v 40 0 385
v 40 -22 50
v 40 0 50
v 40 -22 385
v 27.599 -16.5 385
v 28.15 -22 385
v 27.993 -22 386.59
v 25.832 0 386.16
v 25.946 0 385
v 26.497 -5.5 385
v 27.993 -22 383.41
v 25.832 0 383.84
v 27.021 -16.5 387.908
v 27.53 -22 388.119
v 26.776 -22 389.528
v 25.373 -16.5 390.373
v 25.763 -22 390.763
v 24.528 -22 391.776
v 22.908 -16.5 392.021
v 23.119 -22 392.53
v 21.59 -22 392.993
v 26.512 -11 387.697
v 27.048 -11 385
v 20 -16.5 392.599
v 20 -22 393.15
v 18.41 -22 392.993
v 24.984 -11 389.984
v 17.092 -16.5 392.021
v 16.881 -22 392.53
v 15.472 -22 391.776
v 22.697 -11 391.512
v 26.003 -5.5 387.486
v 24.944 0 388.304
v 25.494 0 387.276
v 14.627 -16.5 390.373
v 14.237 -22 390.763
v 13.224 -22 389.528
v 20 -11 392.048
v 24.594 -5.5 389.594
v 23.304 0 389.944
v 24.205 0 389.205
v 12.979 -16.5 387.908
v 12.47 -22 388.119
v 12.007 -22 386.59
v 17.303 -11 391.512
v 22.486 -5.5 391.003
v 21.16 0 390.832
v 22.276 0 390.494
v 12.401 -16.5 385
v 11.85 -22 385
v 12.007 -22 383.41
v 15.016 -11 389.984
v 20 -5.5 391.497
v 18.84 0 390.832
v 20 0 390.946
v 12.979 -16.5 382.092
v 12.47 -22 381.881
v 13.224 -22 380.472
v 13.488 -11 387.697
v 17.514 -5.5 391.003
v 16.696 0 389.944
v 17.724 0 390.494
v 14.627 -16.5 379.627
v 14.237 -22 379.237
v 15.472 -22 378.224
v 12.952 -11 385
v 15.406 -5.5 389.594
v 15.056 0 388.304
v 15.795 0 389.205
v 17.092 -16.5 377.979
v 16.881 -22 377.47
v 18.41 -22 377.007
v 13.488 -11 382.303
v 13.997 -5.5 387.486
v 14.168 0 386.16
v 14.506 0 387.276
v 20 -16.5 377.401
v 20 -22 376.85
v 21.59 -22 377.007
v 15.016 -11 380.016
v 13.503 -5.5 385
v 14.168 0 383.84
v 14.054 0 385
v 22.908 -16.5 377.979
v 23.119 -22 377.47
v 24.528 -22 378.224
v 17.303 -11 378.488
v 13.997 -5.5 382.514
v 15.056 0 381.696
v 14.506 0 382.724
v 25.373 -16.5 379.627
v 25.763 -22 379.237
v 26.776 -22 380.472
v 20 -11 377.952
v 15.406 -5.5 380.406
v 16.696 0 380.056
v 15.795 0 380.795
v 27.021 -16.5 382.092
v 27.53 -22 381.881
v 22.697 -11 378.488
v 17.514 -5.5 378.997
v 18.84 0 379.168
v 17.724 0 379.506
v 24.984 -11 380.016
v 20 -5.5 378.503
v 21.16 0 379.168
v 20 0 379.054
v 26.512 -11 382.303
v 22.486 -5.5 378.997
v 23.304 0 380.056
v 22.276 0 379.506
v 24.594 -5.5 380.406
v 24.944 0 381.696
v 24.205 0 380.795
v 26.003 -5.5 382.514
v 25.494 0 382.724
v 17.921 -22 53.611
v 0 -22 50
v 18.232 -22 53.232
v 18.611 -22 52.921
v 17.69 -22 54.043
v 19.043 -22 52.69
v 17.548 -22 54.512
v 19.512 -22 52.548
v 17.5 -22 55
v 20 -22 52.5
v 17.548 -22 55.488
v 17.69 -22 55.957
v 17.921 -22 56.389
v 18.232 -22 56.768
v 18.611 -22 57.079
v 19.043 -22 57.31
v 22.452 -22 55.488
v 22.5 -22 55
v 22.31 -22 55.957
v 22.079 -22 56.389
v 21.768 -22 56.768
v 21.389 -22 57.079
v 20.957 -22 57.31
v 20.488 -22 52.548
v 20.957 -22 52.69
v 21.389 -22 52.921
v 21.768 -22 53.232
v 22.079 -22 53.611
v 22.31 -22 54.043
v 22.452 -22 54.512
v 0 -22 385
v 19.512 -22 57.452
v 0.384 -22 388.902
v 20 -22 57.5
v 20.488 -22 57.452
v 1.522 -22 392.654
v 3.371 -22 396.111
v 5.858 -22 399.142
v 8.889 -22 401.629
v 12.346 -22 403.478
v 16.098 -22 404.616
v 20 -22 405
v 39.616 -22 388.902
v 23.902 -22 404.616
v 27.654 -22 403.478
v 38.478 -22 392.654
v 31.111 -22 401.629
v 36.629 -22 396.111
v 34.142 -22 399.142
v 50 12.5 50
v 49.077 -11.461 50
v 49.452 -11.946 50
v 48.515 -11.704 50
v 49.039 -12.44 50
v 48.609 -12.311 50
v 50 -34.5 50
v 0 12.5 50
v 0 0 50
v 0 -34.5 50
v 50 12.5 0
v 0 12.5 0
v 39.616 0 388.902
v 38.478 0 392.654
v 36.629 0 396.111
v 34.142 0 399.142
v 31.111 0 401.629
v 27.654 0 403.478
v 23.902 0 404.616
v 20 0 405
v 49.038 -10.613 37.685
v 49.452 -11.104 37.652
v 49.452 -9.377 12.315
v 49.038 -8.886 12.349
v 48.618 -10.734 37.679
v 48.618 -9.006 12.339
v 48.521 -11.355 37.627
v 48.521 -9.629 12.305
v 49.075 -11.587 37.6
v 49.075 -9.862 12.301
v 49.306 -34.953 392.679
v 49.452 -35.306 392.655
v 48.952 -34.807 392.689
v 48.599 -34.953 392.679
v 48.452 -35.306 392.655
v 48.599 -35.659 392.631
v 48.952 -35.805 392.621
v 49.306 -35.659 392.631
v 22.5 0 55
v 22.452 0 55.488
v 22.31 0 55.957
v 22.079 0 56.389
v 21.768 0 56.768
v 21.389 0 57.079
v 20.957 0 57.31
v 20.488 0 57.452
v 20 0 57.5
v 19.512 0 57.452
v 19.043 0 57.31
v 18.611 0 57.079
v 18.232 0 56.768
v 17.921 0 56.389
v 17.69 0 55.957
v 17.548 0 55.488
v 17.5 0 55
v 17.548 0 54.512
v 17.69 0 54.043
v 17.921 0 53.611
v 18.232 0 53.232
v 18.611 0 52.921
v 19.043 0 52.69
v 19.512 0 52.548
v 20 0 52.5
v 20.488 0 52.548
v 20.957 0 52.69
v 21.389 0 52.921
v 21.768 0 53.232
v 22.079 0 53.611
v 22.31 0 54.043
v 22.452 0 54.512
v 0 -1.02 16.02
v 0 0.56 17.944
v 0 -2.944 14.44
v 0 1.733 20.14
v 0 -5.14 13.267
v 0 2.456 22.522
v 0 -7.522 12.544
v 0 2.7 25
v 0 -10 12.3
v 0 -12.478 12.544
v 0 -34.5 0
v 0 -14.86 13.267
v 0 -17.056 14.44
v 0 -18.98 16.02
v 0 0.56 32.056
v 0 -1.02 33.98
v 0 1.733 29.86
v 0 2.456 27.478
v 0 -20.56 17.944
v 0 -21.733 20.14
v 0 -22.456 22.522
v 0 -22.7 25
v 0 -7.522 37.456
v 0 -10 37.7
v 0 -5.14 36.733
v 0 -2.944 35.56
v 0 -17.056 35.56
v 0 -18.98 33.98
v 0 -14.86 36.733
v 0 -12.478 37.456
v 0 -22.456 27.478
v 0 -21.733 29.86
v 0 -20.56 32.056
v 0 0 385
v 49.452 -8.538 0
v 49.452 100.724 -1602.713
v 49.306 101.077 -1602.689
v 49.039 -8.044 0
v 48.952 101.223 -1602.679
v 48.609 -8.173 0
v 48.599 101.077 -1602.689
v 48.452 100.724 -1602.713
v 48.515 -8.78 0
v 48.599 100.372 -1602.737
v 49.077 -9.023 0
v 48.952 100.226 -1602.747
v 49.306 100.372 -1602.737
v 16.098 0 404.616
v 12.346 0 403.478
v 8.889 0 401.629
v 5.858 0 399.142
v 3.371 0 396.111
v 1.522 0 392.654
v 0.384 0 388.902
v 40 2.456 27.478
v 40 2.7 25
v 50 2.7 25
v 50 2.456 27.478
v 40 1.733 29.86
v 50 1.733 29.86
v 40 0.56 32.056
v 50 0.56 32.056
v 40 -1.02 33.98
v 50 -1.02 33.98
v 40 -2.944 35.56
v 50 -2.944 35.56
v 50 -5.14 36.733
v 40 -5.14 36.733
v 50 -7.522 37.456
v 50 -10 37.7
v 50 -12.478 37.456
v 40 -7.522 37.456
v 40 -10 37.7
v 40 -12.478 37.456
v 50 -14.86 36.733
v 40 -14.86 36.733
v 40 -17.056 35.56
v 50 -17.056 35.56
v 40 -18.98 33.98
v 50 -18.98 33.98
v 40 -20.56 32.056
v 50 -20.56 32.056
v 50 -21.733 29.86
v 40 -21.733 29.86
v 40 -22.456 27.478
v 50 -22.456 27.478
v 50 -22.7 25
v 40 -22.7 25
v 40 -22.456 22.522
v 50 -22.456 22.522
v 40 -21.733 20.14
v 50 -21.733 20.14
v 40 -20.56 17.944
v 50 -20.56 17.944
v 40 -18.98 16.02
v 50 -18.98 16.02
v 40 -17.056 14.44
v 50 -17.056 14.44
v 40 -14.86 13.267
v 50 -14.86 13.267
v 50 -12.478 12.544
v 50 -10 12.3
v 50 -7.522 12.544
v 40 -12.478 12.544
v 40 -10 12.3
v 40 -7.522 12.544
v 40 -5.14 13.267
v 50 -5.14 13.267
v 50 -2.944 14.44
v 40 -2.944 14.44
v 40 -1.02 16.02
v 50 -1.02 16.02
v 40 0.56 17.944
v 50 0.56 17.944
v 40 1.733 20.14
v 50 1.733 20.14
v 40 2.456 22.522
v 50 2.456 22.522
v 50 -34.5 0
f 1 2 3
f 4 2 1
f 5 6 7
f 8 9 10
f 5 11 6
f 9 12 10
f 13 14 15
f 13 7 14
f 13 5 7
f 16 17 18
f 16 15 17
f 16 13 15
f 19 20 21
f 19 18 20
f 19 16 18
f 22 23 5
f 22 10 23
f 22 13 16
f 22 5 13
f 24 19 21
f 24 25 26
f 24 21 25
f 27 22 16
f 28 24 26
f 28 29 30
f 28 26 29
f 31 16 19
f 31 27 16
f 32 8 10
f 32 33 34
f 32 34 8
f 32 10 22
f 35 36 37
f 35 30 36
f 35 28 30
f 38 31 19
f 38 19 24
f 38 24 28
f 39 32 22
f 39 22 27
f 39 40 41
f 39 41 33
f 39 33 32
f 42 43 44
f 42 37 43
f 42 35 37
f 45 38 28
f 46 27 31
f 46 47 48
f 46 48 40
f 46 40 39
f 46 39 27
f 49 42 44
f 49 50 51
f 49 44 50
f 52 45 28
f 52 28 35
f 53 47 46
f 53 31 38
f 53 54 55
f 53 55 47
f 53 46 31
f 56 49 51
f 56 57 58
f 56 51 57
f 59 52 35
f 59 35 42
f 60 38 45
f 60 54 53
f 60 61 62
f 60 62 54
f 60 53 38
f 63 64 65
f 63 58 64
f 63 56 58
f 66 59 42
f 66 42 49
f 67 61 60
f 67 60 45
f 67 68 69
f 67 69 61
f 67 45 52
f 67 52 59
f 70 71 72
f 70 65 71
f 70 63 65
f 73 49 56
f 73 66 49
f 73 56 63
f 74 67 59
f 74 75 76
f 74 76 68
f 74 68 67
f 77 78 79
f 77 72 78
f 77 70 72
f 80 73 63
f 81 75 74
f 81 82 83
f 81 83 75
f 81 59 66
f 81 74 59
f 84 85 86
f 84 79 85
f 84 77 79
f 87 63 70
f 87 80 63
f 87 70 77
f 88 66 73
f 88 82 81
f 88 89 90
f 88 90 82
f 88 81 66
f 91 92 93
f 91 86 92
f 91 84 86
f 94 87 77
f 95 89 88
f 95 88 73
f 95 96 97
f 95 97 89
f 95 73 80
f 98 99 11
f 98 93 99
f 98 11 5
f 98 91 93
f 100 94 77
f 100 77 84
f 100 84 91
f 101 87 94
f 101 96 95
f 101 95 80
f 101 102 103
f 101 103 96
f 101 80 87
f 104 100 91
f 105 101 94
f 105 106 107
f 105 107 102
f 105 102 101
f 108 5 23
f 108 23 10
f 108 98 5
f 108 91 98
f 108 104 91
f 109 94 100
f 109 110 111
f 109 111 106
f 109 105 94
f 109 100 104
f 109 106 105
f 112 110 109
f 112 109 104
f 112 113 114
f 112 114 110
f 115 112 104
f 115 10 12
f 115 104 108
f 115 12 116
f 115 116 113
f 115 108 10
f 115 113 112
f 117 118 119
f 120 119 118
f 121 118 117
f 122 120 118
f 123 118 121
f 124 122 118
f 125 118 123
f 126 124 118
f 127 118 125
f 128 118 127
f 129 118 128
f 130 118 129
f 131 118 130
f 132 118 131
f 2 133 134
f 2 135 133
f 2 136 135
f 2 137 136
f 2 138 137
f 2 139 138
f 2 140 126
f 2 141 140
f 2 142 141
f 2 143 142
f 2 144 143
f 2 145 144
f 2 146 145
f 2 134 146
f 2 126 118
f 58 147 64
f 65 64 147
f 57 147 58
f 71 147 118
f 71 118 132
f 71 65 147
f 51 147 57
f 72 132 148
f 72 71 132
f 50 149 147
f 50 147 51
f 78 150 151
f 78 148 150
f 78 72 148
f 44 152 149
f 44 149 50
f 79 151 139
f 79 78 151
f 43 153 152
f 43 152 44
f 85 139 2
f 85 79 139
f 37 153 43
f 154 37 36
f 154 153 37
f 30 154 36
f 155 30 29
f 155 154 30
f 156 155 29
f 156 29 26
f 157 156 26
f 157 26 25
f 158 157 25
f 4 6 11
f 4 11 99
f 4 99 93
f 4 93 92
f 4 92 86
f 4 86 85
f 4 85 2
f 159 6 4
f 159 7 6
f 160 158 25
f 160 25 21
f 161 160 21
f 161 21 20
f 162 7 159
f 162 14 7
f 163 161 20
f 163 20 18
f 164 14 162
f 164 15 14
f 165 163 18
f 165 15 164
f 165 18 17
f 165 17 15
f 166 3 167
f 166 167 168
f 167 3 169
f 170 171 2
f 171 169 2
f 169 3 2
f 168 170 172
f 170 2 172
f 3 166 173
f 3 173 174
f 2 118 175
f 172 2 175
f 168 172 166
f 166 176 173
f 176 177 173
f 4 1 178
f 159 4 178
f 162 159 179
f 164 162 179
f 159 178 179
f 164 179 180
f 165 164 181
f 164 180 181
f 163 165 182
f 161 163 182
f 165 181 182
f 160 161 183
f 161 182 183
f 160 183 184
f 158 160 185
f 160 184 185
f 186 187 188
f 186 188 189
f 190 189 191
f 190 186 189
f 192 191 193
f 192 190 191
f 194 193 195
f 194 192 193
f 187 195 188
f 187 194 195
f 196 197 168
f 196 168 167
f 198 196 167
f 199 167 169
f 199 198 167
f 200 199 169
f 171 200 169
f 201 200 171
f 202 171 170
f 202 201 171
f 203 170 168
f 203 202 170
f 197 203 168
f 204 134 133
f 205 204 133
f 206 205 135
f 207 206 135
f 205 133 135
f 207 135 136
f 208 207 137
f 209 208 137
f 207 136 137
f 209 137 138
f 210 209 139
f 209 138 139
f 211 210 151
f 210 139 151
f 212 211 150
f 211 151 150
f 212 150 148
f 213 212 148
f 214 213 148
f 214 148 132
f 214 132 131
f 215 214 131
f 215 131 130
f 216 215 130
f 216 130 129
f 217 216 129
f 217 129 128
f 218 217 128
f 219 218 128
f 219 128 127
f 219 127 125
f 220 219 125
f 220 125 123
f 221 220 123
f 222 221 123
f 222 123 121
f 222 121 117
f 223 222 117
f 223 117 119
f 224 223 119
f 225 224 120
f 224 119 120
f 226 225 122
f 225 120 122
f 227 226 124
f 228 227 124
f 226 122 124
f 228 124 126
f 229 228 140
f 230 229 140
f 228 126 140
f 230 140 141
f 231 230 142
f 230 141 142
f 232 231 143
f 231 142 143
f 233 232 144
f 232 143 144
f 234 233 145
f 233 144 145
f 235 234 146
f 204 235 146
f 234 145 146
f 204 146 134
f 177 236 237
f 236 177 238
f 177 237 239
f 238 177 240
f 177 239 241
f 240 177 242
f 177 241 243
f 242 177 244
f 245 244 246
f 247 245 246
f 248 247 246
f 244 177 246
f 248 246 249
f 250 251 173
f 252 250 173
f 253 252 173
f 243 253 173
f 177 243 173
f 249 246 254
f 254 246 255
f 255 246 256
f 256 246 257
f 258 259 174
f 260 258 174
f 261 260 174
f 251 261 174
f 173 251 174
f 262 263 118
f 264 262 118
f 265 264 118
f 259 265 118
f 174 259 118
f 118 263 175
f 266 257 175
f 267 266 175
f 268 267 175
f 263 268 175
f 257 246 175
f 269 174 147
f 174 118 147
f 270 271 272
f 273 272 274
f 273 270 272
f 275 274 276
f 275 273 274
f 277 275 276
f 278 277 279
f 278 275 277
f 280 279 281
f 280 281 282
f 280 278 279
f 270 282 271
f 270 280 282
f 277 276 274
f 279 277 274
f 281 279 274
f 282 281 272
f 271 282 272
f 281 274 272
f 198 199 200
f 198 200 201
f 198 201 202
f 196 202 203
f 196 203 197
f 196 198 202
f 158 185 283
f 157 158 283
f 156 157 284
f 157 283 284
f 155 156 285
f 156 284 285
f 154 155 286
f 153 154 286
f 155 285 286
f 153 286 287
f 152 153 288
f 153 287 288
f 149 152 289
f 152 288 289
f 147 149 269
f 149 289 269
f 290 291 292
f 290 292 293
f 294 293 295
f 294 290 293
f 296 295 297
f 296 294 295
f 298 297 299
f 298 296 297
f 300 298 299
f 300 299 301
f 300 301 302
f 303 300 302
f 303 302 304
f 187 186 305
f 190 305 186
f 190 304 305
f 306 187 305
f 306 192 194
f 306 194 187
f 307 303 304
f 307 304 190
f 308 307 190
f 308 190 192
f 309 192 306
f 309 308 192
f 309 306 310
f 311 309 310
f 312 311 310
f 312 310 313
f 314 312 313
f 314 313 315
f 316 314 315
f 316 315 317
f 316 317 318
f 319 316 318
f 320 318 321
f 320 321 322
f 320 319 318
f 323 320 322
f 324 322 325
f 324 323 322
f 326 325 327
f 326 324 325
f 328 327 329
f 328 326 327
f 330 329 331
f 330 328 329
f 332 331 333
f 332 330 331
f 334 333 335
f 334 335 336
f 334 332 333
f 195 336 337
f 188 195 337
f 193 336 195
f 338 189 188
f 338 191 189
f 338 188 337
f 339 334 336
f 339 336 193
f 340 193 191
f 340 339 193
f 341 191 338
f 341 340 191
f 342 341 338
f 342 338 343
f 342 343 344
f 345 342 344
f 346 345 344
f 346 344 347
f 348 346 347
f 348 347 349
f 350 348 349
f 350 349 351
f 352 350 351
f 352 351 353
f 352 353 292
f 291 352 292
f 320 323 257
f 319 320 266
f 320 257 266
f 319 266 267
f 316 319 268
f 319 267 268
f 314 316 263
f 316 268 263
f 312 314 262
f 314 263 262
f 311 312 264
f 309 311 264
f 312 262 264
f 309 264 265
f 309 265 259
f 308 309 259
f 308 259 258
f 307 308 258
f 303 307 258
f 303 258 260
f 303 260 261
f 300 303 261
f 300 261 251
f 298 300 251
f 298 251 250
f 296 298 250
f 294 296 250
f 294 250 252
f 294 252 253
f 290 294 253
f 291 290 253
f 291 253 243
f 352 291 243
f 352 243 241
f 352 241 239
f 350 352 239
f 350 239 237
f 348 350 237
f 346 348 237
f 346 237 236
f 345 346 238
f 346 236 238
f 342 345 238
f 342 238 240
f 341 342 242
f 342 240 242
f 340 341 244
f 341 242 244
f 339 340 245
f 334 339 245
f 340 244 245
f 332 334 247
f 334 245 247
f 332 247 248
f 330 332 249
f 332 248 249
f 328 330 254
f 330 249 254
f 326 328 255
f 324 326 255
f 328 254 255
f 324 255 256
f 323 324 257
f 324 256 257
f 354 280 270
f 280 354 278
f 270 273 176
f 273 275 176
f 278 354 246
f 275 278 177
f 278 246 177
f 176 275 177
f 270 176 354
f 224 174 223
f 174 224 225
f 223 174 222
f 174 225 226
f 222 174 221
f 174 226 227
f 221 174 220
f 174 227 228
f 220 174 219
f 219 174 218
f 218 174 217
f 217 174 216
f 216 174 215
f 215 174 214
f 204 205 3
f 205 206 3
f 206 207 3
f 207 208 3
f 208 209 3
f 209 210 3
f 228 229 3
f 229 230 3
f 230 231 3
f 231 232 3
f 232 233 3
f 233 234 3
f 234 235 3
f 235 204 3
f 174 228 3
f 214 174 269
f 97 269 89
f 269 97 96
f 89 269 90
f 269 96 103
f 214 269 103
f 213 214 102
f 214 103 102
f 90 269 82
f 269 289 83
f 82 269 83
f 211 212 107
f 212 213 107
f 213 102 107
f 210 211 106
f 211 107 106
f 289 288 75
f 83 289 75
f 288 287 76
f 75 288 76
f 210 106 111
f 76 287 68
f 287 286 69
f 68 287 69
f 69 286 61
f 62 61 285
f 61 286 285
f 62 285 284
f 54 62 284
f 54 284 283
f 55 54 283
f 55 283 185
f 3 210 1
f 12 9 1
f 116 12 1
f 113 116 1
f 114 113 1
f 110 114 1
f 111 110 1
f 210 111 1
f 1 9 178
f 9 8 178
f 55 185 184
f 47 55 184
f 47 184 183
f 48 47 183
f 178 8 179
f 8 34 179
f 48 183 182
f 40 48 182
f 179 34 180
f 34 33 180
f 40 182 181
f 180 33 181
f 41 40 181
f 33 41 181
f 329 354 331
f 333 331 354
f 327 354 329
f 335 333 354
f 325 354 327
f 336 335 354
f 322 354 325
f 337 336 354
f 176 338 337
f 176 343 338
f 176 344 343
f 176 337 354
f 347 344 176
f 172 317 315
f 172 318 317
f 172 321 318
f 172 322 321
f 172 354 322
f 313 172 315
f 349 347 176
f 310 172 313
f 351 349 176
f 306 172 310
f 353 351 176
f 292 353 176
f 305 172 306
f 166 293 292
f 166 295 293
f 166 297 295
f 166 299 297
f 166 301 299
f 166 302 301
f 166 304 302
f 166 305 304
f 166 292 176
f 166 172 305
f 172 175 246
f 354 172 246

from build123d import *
from build123d import SkipClean  # not in build123d's __all__

# Parameters (mm, degrees)
F1_DEPTH      = 22
F2_R          = 8.15
F3_DEPTH      = 22.001
F3_TAPER      = 5.72
F4_W          = 40
F4_H          = 50
F5_DEPTH      = 12.5
F5_DEPTH_BACK = 34.5
F6_R          = 12.7
F7_DEPTH      = 40.001
F8_R          = 12.7
F9_DEPTH      = 10
F10_R         = 2.5
F11_DEPTH     = 25
F14_R         = 0.5
F15_DEPTH     = 2000


# Not quite as in the source:
# - after a boolean that leaves OpenCascade's solid faulty, fix() repairs it


with BuildPart() as f1:
    # F0 (on Front) → F1 (new body)
    with BuildSketch(Plane.XZ):
        with BuildLine():
            Line((0, 385), (0, 0))
            Line((0, 0), (40, 0))
            Line((40, 0), (40, 385))
            ThreePointArc((40, 385), (34.1421356237, 399.1421356237), (20, 405))
            ThreePointArc((20, 405), (5.8578643763, 399.1421356237), (0, 385))
        make_face()
    extrude(amount=F1_DEPTH)

    # F2 (on face) → F3 (cut, through all)
    with BuildSketch(Plane.XZ.offset(22)):
        with Locations((20, 385)):
            Circle(F2_R)
    extrude(amount=-F3_DEPTH, taper=F3_TAPER, mode=Mode.SUBTRACT)

    # F4 (on face) → F5 (join, two sides)
    with BuildSketch(Plane.XZ.offset(22)) as f5_sk:
        with Locations((20, 25)):
            Rectangle(F4_W, F4_H)
    extrude(amount=F5_DEPTH)
    extrude(f5_sk.sketch, amount=-F5_DEPTH_BACK)

    # F6 (on face) → F7 (cut, through all)
    with BuildSketch(Plane(origin=(0, 0, 0), x_dir=(0, -1, 0), z_dir=(-1, 0, 0))):
        with Locations((10, 25)):
            Circle(F6_R)
    extrude(amount=-F7_DEPTH, mode=Mode.SUBTRACT)

    # F8 (on face) → F9 (join)
    with BuildSketch(Plane.YZ.offset(40)):
        Polygon((0, 50), (-22, 50), (-34.5, 50), (-34.5, 0), (12.5, 0), (12.5, 50), align=None)
        with Locations((-10, 25)):
            Circle(F8_R, mode=Mode.SUBTRACT)
    with SkipClean():  # cleaning this boolean's faces spoils the solid; the shape is the same uncleaned
        extrude(amount=F9_DEPTH)

    # F10 (on face) → F11 (cut)
    with BuildSketch(Plane.XZ.offset(22)):
        with Locations((20, 55)):
            Circle(F10_R)
    extrude(amount=-F11_DEPTH, mode=Mode.SUBTRACT)

    add(f1.part.fix(), mode=Mode.REPLACE)

    # F14 (on line) → F15 (join)
    with BuildSketch(Plane(origin=(0, -26.8080383352, 393.2344937713), x_dir=(1, 0, 0), z_dir=(0, -0.0680152907, 0.9976842788))):
        with Locations((48.9524379373, -8.5178036243)):
            Circle(F14_R)
    extrude(amount=-F15_DEPTH)


solid = f1.part
